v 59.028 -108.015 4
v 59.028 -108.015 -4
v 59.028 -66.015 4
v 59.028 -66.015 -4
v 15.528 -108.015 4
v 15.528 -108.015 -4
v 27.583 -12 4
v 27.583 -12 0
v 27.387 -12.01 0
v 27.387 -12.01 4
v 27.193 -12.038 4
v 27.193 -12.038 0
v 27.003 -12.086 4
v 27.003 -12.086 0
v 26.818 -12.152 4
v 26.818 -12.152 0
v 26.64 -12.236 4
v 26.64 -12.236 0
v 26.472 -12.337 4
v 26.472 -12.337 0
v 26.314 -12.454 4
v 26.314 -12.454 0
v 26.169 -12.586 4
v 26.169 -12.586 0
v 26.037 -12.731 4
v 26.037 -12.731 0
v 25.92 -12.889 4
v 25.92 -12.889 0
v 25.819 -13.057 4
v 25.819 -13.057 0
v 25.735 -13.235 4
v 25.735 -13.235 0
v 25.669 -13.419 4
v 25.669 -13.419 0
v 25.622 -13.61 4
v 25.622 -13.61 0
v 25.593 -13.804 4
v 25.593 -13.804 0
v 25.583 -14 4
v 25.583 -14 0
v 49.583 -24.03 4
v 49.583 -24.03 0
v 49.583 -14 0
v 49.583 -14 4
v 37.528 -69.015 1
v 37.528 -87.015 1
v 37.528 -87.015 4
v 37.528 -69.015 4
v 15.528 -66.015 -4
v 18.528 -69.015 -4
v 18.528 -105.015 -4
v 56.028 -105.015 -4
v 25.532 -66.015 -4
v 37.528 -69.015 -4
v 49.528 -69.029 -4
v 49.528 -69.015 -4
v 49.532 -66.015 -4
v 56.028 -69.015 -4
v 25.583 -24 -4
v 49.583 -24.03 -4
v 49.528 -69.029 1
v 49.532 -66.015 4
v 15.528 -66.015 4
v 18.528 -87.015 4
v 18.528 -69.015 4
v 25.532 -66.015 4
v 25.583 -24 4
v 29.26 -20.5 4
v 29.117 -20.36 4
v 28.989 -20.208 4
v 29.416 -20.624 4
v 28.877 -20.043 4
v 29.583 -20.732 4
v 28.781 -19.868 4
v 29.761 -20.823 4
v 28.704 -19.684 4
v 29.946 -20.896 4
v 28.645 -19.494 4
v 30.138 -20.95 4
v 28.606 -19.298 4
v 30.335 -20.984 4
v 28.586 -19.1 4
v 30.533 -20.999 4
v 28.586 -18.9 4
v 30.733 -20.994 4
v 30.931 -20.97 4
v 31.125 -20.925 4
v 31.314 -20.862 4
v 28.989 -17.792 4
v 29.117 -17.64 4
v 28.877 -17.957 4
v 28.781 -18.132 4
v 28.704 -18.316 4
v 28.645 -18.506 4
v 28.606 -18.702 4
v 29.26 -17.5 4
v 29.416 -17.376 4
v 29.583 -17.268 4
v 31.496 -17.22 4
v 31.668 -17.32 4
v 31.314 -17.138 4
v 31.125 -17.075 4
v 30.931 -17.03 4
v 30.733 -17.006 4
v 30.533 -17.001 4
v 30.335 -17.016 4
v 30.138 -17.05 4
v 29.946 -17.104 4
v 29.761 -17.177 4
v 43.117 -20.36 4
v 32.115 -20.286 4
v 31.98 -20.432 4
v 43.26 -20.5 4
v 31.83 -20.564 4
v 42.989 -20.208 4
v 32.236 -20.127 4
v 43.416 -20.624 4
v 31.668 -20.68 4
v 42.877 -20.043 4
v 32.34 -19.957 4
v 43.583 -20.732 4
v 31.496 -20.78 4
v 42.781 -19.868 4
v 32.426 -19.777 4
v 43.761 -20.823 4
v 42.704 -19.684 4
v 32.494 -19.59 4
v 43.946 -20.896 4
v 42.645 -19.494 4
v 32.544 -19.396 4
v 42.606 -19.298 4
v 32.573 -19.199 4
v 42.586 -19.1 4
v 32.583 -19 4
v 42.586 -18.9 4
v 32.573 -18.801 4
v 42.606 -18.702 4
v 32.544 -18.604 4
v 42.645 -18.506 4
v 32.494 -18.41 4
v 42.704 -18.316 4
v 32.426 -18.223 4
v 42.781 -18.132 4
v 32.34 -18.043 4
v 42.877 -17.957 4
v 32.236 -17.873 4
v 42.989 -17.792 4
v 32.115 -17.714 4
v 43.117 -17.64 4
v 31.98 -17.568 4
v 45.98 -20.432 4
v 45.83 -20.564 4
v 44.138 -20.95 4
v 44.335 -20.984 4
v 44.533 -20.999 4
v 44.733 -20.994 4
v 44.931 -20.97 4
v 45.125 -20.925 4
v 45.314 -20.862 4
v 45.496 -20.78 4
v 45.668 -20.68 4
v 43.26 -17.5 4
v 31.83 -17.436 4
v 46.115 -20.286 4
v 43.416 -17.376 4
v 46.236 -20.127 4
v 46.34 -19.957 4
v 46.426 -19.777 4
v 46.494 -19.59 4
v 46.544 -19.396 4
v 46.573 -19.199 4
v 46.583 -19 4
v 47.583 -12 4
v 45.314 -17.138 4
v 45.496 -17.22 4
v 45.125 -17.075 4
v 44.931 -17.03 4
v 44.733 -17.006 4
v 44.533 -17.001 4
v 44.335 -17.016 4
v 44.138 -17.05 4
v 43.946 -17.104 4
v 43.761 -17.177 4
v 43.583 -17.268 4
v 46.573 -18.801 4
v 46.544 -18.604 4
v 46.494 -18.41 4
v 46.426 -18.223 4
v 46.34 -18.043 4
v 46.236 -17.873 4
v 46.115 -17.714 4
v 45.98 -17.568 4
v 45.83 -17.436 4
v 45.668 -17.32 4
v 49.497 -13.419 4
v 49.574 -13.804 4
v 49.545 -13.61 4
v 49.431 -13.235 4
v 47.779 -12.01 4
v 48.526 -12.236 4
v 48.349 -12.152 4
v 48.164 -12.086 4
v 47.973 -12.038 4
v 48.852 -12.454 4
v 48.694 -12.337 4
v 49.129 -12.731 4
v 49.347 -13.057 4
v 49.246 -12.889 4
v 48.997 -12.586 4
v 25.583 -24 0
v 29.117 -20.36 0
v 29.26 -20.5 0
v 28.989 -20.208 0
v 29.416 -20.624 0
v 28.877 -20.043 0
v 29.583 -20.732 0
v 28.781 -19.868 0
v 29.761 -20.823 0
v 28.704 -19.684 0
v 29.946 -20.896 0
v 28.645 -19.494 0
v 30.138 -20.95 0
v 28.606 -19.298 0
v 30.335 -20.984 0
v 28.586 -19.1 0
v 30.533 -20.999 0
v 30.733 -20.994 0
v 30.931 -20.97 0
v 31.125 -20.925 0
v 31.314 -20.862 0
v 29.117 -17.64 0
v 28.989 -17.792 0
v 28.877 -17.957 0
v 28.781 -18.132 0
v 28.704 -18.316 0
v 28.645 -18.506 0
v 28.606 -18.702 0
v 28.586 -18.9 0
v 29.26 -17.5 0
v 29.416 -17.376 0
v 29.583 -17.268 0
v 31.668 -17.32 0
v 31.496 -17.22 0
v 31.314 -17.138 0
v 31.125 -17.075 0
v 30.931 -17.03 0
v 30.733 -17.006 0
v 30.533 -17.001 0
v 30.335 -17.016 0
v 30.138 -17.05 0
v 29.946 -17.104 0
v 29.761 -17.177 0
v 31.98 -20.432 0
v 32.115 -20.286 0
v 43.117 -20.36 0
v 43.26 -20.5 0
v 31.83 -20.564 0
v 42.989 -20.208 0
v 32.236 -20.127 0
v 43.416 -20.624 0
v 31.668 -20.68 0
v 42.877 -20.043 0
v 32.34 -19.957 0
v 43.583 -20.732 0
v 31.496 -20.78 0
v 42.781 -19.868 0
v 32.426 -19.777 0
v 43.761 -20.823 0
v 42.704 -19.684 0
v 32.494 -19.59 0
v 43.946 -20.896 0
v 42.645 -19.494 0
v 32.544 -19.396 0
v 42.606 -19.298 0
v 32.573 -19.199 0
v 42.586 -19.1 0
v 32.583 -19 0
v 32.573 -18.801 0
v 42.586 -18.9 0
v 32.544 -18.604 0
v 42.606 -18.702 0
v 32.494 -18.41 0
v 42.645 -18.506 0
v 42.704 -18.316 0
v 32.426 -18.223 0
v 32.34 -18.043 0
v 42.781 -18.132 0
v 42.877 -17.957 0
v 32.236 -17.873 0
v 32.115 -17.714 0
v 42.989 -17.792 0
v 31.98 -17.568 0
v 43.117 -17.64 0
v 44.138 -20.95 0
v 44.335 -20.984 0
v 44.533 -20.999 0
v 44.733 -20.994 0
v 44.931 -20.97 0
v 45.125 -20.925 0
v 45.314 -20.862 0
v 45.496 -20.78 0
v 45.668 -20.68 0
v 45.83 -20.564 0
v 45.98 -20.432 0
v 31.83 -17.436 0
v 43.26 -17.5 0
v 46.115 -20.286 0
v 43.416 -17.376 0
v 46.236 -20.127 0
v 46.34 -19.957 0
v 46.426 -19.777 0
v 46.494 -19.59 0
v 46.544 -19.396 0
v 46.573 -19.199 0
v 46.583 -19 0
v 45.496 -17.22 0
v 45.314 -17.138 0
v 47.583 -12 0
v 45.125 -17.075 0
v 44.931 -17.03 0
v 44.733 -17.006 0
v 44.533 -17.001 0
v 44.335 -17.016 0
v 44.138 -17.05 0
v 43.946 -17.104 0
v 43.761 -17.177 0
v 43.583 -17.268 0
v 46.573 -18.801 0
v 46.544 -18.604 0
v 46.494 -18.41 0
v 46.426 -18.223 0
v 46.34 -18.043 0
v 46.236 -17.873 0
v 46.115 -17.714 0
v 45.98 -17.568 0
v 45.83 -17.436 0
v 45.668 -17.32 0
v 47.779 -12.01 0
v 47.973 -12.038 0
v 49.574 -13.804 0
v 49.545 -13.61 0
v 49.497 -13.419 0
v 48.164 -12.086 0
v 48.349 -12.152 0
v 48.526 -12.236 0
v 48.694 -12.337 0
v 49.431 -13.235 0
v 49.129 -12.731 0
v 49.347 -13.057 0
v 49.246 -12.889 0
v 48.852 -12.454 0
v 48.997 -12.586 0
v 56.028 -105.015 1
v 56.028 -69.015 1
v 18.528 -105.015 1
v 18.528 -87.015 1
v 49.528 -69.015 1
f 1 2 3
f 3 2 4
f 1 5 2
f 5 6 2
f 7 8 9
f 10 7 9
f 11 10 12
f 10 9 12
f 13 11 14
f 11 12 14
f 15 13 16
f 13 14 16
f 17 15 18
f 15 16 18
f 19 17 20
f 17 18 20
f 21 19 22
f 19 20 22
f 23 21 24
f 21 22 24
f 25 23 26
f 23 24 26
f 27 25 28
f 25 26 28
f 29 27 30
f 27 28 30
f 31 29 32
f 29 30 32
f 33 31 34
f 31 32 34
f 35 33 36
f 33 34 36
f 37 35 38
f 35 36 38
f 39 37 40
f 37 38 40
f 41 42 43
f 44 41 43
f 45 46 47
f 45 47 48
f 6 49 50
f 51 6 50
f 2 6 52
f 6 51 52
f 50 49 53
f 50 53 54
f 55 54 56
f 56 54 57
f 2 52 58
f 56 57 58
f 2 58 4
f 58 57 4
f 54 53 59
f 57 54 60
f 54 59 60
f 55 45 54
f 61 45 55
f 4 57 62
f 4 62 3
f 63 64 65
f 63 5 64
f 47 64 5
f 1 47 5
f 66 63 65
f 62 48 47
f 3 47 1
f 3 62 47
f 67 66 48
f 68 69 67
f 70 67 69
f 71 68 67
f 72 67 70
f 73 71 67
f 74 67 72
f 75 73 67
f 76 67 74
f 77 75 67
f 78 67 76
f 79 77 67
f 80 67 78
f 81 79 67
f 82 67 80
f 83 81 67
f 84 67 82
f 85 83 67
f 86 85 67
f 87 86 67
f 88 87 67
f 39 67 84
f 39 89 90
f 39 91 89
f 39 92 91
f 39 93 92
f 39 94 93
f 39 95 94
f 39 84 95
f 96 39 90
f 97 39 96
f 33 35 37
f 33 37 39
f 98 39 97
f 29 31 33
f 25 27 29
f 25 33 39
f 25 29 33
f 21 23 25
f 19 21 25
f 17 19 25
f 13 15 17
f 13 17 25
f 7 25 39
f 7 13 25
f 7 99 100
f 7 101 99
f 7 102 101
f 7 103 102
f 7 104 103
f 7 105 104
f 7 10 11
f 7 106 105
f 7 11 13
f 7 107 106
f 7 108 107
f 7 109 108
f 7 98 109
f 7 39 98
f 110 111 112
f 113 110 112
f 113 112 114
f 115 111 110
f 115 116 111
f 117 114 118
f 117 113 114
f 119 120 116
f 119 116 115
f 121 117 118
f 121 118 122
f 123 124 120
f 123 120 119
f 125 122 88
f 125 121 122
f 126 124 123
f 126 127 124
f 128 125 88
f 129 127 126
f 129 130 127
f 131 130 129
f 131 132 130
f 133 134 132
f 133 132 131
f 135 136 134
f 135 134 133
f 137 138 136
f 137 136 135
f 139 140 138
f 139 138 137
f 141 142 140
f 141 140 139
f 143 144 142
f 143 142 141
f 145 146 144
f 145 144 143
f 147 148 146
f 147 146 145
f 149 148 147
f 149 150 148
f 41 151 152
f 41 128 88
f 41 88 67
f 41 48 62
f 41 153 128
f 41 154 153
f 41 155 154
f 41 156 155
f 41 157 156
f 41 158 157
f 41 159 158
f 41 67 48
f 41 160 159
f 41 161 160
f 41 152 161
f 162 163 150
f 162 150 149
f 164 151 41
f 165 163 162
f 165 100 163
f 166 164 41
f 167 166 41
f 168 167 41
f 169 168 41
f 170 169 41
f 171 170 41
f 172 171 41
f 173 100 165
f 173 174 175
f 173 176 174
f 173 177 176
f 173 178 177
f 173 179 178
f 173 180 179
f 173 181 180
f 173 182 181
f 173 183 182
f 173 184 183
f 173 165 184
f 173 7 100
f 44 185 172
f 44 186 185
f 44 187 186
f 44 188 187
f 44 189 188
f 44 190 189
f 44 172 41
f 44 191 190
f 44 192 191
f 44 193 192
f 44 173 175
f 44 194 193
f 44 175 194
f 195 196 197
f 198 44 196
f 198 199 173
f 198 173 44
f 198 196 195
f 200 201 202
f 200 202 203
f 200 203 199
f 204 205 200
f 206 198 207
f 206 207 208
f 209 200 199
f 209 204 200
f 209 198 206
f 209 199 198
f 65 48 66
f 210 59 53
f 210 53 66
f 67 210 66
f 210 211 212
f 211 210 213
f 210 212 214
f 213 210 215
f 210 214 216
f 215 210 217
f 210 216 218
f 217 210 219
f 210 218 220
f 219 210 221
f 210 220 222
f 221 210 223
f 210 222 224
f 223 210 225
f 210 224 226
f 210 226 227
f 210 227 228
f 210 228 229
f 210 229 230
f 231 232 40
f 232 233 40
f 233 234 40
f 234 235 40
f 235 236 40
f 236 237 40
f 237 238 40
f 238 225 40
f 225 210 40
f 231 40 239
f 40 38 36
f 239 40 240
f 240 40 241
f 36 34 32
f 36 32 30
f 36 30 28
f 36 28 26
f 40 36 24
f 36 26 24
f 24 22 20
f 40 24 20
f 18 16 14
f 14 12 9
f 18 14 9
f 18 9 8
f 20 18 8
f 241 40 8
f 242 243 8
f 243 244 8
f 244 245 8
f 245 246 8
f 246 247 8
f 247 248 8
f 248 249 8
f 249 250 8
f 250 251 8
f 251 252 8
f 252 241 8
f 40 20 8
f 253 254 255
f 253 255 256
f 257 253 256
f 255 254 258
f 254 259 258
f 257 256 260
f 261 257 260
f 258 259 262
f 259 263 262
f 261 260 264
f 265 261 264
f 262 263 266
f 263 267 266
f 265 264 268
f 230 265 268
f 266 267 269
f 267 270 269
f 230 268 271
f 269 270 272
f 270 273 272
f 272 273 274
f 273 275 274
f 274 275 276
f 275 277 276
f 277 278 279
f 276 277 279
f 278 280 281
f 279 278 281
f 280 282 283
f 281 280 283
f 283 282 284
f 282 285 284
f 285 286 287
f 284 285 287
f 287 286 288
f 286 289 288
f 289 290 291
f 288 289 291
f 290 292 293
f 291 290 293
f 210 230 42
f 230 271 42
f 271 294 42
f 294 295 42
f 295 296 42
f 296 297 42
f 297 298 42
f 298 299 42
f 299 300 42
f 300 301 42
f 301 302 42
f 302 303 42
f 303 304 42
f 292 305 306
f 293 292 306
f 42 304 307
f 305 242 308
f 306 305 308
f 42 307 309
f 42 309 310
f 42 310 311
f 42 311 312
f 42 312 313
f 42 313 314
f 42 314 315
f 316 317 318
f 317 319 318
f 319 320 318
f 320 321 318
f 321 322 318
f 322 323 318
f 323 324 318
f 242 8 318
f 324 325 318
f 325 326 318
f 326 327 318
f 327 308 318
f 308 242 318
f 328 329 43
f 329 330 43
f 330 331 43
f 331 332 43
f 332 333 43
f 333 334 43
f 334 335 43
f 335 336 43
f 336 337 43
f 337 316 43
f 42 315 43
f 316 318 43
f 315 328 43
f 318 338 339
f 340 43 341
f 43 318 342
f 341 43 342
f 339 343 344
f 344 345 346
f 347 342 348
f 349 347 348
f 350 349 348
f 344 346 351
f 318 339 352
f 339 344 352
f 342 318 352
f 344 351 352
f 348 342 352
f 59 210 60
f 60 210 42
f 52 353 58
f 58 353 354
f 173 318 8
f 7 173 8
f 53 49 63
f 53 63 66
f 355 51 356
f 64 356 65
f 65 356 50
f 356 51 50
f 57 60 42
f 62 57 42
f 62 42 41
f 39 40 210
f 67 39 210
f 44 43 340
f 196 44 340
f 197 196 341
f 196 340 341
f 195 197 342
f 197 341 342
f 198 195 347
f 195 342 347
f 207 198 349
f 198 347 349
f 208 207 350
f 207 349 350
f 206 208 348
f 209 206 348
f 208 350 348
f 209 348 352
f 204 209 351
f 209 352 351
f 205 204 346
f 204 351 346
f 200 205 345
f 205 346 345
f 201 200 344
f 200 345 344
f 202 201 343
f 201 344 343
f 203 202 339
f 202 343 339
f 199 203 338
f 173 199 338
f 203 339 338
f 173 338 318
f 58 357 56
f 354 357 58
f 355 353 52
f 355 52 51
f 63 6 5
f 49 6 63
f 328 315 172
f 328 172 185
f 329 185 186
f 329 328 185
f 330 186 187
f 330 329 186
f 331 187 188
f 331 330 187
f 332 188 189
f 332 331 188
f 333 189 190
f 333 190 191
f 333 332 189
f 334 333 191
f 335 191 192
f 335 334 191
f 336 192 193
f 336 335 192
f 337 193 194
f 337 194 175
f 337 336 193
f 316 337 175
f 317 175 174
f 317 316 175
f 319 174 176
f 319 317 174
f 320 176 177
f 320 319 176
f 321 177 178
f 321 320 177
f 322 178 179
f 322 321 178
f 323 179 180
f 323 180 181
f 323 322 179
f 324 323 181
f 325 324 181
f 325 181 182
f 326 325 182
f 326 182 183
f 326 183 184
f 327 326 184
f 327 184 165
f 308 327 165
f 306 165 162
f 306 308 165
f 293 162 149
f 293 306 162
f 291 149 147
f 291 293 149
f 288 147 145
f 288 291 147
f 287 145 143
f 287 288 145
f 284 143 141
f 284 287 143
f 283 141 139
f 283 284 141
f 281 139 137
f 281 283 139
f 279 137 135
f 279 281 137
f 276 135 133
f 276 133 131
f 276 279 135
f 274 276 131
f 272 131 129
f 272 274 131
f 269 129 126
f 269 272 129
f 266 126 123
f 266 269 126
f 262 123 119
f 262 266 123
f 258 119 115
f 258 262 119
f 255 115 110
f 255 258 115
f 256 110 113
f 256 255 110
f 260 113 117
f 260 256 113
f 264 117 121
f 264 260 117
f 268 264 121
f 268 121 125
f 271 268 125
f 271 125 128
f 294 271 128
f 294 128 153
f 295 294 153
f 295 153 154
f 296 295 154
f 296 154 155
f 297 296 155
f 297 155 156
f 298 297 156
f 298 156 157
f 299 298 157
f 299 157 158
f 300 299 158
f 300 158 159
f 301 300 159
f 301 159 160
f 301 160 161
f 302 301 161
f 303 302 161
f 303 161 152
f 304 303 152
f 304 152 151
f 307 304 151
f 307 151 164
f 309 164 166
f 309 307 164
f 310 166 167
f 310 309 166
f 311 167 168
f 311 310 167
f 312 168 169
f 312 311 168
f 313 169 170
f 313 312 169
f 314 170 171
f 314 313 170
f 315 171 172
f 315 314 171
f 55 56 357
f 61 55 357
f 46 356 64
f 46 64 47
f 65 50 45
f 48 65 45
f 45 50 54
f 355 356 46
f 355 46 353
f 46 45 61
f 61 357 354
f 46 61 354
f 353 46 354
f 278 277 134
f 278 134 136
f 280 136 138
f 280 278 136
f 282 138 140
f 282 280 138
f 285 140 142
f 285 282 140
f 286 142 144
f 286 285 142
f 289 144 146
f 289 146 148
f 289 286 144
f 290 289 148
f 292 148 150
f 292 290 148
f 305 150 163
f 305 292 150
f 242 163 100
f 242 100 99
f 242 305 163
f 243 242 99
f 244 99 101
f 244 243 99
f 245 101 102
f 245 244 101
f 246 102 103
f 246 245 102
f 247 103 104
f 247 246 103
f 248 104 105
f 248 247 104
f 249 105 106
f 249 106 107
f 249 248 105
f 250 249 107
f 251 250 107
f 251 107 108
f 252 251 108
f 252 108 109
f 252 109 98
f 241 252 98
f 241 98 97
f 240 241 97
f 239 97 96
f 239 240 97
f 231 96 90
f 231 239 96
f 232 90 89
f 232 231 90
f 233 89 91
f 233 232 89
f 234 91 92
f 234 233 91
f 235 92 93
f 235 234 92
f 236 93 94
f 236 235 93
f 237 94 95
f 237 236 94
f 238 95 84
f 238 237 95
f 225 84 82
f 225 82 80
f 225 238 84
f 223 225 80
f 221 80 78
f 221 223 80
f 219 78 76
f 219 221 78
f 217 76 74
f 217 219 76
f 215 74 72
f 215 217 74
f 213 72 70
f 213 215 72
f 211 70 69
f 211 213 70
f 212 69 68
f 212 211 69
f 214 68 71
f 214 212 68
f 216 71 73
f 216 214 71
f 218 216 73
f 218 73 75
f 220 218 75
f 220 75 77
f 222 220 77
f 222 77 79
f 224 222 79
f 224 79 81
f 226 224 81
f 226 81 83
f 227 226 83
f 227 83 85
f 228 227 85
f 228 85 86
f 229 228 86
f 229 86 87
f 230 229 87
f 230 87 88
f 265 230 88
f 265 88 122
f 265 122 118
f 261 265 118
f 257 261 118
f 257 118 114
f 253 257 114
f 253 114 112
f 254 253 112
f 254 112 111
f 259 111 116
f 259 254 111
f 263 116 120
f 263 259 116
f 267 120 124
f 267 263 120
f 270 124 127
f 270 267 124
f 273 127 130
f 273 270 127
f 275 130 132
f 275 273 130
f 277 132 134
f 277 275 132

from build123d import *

# Parameters (mm, degrees)
SKETCH_1_R      = 2
EXTRUDE_1_DEPTH = 4
SKETCH_2_W      = 24.000018158
SKETCH_2_H      = 8
EXTRUDE_2_DEPTH = 45
EXTRUDE_START   = -3
EXTRUDE_3_DEPTH = 5
SKETCH_4_W      = 43.5
SKETCH_4_H      = 42
SKETCH_4_W_2    = 19
SKETCH_4_H_2    = 18
EXTRUDE_4_DEPTH = 3


with BuildPart() as part:
    # 草图1 → 凸台-拉伸1 (new body)
    with BuildSketch(Plane.XY):
        with BuildLine():
            Line((49.58322575, -24.029522484), (49.58322575, -14))
            ThreePointArc((49.58322575, -14), (48.997439312, -12.585786438), (47.58322575, -12))
            Line((47.58322575, -12), (27.58322575, -12))
            ThreePointArc((27.58322575, -12), (26.169012187, -12.585786438), (25.58322575, -14))
            Line((25.58322575, -14), (25.58322575, -24))
            Line((25.58322575, -24), (49.58322575, -24.029522484))
        make_face()
        with Locations((30.58322575, -19)):
            Circle(SKETCH_1_R, mode=Mode.SUBTRACT)
        with Locations((44.58322575, -19)):
            Circle(SKETCH_1_R, mode=Mode.SUBTRACT)
    extrude(amount=EXTRUDE_1_DEPTH)

    # 草图2 → 凸台-拉伸2 (add)
    with BuildSketch(Plane(origin=(-0.029483728, -23.968493717, 0), x_dir=(0.9999992434235635, -0.0012301025569531234, 0), z_dir=(-0.0012301025569531234, -0.9999992434235636, 0))):
        with Locations((37.612737934, 0)):
            Rectangle(SKETCH_2_W, SKETCH_2_H)
    extrude(amount=EXTRUDE_2_DEPTH)

    # 草图3 → 凸台-拉伸3 (add)
    with BuildSketch(Plane.XY.offset(4).offset(EXTRUDE_START)):
        Polygon((37.527871134, -66.014727196), (15.527871134, -66.014727196), (15.527871134, -108.014727196), (37.027871134, -108.014727196), (59.027871134, -108.014727196), (59.027871134, -66.014727196), align=None)
        Polygon((37.527871134, -69.014727196), (18.527871134, -69.014727196), (18.527871134, -105.014727196), (37.027871134, -105.014727196), (56.027871134, -105.014727196), (56.027871134, -69.014727196), align=None, mode=Mode.SUBTRACT)
    extrude(amount=-EXTRUDE_3_DEPTH)

    # 草图4 → 凸台-拉伸4 (add)
    with BuildSketch(Plane.XY.offset(1)):
        with Locations((37.277871134, -87.014727196)):
            Rectangle(SKETCH_4_W, SKETCH_4_H)
        with Locations((28.027871134, -78.014727196)):
            Rectangle(SKETCH_4_W_2, SKETCH_4_H_2, mode=Mode.SUBTRACT)
    extrude(amount=EXTRUDE_4_DEPTH)


solid = part.part
